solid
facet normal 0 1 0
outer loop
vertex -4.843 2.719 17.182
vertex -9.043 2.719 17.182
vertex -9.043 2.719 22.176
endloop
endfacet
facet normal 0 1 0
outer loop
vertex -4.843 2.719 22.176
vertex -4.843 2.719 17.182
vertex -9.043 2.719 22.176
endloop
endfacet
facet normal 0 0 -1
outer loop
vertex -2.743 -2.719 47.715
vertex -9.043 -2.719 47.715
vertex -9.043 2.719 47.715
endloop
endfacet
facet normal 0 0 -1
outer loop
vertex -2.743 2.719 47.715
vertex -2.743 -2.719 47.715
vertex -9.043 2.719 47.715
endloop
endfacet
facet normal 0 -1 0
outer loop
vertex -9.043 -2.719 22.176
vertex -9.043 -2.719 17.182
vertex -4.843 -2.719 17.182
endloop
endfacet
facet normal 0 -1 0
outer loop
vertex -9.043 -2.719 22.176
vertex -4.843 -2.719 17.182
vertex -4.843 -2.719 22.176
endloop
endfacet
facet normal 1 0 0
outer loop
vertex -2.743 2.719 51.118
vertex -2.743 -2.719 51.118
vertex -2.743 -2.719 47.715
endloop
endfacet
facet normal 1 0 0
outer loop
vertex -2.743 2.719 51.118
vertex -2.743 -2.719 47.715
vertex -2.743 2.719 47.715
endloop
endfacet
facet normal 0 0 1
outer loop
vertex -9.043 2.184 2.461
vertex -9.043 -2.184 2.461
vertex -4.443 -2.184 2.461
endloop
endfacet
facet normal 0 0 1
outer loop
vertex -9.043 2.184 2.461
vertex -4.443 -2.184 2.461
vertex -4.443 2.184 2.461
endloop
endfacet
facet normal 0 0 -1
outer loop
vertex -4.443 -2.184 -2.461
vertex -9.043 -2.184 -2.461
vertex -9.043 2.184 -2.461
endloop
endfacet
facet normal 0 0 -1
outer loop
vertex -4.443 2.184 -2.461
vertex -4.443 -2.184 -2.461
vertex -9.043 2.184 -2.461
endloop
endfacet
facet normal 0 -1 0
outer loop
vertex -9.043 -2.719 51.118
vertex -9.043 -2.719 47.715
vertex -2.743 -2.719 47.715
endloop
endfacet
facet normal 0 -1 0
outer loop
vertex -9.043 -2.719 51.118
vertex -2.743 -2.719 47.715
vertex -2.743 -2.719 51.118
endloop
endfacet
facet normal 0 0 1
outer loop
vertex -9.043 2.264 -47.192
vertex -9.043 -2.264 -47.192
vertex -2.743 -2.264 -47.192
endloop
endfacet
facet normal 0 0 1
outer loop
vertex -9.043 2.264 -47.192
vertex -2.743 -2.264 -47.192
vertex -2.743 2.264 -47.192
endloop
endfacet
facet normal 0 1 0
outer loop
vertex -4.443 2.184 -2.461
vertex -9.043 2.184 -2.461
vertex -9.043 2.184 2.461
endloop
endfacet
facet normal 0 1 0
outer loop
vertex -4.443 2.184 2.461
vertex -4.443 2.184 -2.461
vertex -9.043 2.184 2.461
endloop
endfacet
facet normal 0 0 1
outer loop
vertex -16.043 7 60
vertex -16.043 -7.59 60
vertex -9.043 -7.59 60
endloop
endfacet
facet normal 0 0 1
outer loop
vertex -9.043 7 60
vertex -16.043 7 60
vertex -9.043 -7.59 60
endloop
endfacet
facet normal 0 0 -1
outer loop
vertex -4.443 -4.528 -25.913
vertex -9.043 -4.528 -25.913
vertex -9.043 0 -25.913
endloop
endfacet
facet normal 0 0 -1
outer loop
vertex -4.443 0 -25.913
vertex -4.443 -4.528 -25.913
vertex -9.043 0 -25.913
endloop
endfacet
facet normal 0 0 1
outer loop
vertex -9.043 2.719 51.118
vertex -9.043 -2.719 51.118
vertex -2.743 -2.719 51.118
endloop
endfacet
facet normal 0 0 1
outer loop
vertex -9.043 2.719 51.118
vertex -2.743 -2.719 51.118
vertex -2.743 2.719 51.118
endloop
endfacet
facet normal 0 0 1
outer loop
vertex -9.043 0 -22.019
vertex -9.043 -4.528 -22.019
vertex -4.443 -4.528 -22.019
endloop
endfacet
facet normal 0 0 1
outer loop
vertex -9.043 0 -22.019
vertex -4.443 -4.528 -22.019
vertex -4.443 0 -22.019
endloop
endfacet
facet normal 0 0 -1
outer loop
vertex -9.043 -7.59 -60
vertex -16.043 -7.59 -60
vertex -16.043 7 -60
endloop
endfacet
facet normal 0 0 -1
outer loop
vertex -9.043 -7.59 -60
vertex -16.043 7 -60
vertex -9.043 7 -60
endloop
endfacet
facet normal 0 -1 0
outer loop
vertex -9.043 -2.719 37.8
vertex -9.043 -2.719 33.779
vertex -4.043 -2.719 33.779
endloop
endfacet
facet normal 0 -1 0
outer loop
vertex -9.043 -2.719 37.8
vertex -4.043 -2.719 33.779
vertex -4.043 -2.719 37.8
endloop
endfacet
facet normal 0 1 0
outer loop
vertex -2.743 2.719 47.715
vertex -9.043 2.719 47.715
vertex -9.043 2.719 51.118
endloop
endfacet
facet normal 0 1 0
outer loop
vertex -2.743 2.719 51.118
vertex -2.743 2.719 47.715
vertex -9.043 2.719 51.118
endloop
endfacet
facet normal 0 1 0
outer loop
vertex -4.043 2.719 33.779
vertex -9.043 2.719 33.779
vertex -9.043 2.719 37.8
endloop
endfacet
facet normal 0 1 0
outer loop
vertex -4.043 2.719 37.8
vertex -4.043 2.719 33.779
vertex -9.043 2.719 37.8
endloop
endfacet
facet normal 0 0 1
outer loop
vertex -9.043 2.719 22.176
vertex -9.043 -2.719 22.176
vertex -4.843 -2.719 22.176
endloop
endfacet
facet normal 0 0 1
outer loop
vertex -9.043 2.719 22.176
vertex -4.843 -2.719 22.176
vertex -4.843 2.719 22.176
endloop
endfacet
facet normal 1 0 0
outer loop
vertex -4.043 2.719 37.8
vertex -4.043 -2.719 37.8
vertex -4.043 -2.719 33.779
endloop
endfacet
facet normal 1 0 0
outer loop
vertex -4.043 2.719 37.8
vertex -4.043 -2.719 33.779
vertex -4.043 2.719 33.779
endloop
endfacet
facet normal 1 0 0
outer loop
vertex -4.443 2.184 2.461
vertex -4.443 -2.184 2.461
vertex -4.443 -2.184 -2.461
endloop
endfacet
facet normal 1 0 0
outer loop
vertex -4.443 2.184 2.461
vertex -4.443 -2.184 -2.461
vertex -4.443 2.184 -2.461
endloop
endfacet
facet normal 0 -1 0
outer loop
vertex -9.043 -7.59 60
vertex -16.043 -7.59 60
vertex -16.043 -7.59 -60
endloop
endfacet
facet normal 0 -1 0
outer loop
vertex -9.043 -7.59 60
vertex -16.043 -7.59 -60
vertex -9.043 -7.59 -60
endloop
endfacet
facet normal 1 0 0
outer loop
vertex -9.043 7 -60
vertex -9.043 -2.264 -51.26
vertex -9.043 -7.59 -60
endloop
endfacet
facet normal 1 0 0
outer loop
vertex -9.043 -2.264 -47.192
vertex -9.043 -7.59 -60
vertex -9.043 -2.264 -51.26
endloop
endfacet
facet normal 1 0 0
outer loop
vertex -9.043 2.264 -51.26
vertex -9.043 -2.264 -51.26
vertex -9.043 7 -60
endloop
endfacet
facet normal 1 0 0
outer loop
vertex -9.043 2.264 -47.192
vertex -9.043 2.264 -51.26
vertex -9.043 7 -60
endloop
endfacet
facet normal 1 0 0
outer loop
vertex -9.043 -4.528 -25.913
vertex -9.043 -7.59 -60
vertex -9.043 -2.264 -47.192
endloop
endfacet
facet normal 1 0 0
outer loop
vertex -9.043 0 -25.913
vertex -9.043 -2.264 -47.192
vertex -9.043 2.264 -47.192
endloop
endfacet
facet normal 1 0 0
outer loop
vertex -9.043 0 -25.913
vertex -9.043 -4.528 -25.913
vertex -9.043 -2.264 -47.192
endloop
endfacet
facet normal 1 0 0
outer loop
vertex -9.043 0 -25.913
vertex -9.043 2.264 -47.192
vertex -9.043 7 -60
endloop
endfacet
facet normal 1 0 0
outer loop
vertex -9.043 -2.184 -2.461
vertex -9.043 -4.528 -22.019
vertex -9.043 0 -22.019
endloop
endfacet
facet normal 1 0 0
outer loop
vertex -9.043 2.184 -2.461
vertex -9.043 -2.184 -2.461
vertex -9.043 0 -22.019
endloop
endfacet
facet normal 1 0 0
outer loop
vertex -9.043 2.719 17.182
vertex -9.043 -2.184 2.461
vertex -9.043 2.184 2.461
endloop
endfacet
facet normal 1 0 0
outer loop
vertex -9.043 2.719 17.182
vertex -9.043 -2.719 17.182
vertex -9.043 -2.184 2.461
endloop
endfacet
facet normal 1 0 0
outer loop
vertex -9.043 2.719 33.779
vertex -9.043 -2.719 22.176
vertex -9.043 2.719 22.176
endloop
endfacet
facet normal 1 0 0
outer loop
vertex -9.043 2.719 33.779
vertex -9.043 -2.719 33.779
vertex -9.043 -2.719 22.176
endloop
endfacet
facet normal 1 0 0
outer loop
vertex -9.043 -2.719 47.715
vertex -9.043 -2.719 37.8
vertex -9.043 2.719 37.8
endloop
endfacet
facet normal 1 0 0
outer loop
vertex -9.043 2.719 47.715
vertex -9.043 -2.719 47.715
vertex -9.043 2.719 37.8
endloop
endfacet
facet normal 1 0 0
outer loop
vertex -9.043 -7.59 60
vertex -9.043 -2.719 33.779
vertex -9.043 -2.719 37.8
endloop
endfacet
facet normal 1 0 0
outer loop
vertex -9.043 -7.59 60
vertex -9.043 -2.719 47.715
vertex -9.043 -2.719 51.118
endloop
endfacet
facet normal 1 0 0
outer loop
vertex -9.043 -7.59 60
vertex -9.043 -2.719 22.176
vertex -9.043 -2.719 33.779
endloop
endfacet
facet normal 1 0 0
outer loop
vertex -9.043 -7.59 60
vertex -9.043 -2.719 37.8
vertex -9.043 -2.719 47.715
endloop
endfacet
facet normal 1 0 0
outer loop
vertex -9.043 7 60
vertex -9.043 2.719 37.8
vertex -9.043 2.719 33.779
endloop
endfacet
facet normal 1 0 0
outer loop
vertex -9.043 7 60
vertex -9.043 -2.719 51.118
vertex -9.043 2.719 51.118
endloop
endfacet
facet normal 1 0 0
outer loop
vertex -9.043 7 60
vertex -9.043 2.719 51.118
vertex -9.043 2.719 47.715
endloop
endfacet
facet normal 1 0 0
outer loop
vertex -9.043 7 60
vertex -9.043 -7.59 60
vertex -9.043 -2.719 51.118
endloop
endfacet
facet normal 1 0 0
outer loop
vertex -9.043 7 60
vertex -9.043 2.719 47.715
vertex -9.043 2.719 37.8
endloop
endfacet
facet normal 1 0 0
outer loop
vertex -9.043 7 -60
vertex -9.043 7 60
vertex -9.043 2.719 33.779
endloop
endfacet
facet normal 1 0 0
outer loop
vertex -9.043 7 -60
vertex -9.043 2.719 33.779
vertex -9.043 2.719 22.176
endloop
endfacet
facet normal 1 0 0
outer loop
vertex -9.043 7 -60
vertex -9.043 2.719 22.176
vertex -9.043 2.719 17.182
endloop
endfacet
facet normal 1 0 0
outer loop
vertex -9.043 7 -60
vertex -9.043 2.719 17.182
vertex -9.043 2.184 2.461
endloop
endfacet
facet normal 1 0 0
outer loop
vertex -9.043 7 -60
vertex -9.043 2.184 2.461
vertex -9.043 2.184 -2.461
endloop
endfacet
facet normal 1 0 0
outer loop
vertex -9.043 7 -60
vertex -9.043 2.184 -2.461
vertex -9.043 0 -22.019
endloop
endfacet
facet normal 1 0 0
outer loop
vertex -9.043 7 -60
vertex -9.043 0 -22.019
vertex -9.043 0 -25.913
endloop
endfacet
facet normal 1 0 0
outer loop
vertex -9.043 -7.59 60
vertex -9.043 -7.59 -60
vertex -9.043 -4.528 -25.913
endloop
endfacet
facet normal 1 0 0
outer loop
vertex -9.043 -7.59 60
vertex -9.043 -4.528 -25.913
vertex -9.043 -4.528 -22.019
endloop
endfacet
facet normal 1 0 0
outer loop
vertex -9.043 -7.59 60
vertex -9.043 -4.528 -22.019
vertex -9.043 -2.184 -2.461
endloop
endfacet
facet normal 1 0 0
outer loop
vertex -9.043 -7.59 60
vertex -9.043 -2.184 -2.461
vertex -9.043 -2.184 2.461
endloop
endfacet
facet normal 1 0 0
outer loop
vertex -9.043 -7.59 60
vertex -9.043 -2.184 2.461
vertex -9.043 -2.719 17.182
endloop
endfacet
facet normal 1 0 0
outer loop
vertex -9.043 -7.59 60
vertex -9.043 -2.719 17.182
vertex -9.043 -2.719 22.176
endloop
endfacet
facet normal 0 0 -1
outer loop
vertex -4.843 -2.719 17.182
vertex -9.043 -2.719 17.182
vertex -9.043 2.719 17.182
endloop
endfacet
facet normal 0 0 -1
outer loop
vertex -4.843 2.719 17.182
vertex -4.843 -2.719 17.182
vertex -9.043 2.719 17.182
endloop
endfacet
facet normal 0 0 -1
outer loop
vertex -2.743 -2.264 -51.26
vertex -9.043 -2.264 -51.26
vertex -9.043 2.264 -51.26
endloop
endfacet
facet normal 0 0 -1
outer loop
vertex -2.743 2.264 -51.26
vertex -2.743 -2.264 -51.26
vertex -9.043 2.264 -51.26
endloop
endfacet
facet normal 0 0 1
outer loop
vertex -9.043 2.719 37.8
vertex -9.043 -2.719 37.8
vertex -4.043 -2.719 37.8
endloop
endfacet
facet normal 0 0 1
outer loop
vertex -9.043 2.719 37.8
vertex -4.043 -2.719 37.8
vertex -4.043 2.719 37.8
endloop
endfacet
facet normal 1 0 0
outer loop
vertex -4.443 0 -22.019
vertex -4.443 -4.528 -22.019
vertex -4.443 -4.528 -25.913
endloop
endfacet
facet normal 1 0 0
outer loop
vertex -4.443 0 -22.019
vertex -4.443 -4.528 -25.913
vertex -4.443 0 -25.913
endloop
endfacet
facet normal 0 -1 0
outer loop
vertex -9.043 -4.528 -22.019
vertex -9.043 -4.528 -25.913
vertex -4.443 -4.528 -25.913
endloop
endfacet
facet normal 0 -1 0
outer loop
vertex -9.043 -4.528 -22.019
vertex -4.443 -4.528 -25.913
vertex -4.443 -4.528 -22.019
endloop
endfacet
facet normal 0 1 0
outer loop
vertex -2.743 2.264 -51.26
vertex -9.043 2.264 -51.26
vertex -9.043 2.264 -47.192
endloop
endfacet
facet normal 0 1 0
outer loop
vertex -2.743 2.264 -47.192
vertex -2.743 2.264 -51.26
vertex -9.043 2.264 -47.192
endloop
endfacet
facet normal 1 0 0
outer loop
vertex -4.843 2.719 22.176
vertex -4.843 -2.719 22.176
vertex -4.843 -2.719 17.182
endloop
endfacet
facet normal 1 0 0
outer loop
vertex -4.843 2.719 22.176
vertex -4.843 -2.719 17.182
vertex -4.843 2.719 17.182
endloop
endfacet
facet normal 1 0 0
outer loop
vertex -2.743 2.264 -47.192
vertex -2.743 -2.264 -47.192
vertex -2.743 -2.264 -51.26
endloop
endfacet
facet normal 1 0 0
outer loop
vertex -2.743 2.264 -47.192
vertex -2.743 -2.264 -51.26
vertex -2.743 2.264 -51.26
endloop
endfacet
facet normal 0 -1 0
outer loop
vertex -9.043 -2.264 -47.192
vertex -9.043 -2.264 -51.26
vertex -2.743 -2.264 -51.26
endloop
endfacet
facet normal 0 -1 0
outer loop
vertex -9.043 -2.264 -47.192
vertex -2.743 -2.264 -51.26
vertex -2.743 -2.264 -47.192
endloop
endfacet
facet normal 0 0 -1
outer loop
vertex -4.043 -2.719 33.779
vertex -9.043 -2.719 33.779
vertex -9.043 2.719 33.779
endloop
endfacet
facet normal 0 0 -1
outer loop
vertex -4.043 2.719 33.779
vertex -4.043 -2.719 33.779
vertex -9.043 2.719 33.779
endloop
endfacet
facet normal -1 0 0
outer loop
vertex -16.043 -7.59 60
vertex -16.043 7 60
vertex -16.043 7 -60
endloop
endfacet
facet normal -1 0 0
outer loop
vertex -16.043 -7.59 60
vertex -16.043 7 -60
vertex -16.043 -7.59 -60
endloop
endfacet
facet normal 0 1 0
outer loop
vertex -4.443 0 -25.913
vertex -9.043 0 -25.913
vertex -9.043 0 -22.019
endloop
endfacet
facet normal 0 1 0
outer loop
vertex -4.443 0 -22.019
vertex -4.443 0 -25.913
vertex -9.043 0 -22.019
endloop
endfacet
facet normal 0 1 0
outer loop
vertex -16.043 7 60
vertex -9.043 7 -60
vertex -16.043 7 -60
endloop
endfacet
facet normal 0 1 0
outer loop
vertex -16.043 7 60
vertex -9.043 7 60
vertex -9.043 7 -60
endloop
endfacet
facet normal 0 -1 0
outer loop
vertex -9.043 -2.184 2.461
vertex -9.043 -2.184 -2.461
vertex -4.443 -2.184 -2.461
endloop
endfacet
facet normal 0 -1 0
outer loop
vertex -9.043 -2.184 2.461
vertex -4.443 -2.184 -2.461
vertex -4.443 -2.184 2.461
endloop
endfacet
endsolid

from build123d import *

# Parameters (mm, degrees)
F1_DEPTH = 60
F2_W     = 5.437252
F2_H     = 3.403648
F2_W_2   = 4.52817
F2_H_2   = 4.068502
F3_DEPTH = 6.3
F2_H_3   = 4.993211
F4_DEPTH = 4.2
F2_H_4   = 4.021845
F5_DEPTH = 5
F2_W_3   = 4.367254
F2_H_5   = 4.921976
F6_DEPTH = 4.6
F2_H_6   = 3.894821
F7_DEPTH = 4.6


with BuildPart() as f1:
    # F0 (on Top) → F1 (new body, symmetric)
    with BuildSketch(Plane.XY):
        Polygon((-9.043264, 0), (-9.043264, 7), (-16.043264, 7), (-16.043264, 0), (-16.043264, -7.59036), (-9.043264, -7.59036), align=None)
    extrude(amount=F1_DEPTH, both=True)

    # F2 (on face) → F3 (join)
    with BuildSketch(Plane.YZ.offset(-9.043264)):
        with Locations((0, 49.416557)):
            Rectangle(F2_W, F2_H)
        with Locations((0, -49.225945)):
            Rectangle(F2_W_2, F2_H_2)
    extrude(amount=F3_DEPTH)

    # F2 (on face) → F4 (join)
    with BuildSketch(Plane.YZ.offset(-9.043264)):
        with Locations((0, 19.678933)):
            Rectangle(F2_W, F2_H_3)
    extrude(amount=F4_DEPTH)

    # F2 (on face) → F5 (join)
    with BuildSketch(Plane.YZ.offset(-9.043264)):
        with Locations((0, 35.789437)):
            Rectangle(F2_W, F2_H_4)
    extrude(amount=F5_DEPTH)

    # F2 (on face) → F6 (join)
    with BuildSketch(Plane.YZ.offset(-9.043264)):
        Rectangle(F2_W_3, F2_H_5)
    extrude(amount=F6_DEPTH)

    # F2 (on face) → F7 (join)
    with BuildSketch(Plane.YZ.offset(-9.043264)):
        with Locations((-2.264085, -23.966038)):
            Rectangle(F2_W_2, F2_H_6)
    extrude(amount=F7_DEPTH)


solid = f1.part
